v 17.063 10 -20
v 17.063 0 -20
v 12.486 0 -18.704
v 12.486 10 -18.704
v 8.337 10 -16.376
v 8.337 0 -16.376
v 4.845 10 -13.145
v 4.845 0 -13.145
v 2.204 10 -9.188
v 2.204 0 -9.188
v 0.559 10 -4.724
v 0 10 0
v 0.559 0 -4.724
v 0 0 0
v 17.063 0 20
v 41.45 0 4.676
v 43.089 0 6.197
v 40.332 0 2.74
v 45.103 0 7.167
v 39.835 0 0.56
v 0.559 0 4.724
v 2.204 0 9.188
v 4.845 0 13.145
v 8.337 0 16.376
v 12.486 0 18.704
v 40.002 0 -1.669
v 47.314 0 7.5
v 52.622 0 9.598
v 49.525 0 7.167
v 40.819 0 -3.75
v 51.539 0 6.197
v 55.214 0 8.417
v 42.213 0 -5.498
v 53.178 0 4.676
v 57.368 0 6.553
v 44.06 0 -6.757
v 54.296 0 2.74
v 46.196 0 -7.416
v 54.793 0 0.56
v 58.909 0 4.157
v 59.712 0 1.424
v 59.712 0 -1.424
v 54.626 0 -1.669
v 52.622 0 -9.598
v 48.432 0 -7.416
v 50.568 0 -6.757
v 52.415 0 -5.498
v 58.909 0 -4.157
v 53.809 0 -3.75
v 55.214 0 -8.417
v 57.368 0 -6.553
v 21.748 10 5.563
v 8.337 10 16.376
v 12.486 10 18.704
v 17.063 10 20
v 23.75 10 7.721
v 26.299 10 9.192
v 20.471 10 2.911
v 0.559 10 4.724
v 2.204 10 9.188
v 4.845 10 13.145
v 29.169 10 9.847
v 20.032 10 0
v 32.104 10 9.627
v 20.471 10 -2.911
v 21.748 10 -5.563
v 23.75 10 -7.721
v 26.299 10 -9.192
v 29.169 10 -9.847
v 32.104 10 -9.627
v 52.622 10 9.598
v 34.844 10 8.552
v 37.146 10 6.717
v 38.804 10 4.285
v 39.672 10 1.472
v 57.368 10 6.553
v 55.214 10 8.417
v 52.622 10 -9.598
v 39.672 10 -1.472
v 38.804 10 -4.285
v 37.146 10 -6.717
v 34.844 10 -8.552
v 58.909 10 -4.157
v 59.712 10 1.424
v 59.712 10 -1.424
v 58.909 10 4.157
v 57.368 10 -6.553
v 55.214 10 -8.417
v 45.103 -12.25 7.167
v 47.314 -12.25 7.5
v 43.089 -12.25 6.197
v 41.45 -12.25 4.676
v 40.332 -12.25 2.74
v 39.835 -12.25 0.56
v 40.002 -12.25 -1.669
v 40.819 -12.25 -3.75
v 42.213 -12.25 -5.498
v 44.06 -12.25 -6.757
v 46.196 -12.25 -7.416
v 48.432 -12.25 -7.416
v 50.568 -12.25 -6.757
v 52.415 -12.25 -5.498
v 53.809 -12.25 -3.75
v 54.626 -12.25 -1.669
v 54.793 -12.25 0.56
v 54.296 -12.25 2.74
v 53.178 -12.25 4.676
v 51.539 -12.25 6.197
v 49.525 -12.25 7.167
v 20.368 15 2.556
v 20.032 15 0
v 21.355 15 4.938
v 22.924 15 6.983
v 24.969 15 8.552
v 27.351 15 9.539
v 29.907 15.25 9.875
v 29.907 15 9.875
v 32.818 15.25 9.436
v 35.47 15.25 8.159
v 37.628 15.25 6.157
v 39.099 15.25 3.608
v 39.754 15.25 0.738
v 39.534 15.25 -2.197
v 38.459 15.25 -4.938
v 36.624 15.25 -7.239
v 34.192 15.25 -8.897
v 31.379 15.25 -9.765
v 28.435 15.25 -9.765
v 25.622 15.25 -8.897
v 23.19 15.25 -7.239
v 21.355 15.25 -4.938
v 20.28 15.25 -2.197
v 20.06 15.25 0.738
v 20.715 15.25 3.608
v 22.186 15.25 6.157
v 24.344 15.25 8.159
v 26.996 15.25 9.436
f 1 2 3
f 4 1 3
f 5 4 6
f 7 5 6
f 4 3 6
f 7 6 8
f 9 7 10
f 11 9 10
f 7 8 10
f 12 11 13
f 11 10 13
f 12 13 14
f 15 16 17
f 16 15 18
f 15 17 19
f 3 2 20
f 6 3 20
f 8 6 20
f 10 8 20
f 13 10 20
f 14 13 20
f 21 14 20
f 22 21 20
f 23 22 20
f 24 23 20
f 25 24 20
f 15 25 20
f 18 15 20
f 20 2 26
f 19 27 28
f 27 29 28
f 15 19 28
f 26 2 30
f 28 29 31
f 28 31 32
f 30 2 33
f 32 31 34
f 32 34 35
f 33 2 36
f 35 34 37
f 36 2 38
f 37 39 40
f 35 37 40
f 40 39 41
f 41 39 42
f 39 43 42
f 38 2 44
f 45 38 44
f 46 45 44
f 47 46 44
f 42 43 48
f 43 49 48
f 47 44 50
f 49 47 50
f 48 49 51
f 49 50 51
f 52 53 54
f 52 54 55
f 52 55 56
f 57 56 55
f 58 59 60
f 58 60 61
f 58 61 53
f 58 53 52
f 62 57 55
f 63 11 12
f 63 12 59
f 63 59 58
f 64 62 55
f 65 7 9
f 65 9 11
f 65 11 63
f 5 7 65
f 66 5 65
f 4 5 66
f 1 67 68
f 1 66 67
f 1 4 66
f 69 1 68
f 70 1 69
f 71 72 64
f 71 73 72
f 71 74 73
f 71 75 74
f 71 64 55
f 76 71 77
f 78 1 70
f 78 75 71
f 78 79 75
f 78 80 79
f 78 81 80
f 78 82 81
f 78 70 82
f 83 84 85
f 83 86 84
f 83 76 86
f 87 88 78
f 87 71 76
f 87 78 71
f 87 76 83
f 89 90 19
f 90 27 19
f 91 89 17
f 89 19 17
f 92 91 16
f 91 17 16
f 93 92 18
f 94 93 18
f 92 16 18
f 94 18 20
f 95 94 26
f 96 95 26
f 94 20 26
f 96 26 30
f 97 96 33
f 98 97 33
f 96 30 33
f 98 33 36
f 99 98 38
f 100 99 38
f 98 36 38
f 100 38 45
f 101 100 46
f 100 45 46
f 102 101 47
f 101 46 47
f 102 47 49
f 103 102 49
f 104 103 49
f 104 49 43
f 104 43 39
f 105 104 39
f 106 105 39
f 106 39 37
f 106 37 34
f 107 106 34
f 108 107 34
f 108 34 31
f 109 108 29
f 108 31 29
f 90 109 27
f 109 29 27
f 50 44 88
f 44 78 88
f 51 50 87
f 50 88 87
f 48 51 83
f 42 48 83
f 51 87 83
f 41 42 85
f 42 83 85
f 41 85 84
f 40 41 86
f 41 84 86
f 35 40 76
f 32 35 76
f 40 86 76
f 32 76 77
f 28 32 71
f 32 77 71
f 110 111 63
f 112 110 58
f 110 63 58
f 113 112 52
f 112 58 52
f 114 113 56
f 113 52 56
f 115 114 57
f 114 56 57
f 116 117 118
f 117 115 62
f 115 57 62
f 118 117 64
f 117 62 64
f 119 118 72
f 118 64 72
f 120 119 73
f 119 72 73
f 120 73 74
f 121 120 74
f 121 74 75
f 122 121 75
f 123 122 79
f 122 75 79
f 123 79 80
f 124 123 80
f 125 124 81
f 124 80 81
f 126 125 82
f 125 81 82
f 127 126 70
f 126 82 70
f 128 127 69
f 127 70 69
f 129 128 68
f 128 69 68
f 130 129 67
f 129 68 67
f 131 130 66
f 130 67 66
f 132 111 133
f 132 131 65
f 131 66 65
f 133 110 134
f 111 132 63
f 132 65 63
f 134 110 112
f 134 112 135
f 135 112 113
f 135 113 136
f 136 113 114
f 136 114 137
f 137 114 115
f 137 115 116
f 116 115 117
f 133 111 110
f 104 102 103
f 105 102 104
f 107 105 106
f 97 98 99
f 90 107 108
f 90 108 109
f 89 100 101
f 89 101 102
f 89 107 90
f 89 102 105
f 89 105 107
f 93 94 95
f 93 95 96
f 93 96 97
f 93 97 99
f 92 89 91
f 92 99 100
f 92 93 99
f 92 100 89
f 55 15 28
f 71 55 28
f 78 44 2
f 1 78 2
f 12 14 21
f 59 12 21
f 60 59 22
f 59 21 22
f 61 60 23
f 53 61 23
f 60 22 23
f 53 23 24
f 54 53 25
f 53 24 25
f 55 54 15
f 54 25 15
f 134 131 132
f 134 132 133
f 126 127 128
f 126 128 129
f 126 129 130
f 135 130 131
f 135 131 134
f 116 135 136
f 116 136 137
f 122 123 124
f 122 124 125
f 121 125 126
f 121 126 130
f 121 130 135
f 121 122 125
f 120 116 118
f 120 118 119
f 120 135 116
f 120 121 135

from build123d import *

# Parameters (mm, degrees)
BOSS_EXTRUDE9_DEPTH  = 10
FILLET8_R            = 10
BOSS_EXTRUDE10_DEPTH = 5
SKETCH12_R           = 7.5
BOSS_EXTRUDE11_DEPTH = 12.5
SKETCH14_R           = 9.875
BOSS_EXTRUDE12_DEPTH = 0.25
CUT_EXTRUDE1_START   = -0.25
SKETCH15_R           = 7.5
CUT_EXTRUDE1_DEPTH   = 0.25
CUT_EXTRUDE2_START   = -12
SKETCH18_R           = 7.5
CUT_EXTRUDE2_DEPTH   = 12
SKETCH19_R           = 7.5
BOSS_EXTRUDE13_DEPTH = 12


with BuildPart() as part:
    # Sketch8 → Boss-Extrude9 (new body)
    with BuildSketch(Plane(origin=(0, 0, 0), x_dir=(1, 0, 0), z_dir=(0, 1, 0))):
        Polygon((17.063256467, 20), (17.063256467, 0), (85.43, 0), align=None)
        with BuildLine():
            ThreePointArc((17.063256467, 20), (4.845449314, 13.144910814), (0, 0))
            Line((0, 0), (17.063256467, 0))
            Line((17.063256467, 0), (17.063256467, 20))
        make_face()
        with BuildLine():
            Line((17.063256467, 0), (0, 0))
            ThreePointArc((0, 0), (4.845449314, -13.144910814), (17.063256467, -20))
            Line((17.063256467, -20), (17.063256467, 0))
        make_face()
        Polygon((85.43, 0), (17.063256467, 0), (17.063256467, -20), align=None)
    extrude(amount=BOSS_EXTRUDE9_DEPTH)

    # Fillet8
    fillet8_edges = [part.edges().sort_by_distance(p)[0] for p in [
        (85.43, 5, 0),
    ]]
    fillet(fillet8_edges, radius=FILLET8_R)

    # Sketch11 → Boss-Extrude10 (add)
    with BuildSketch(Plane(origin=(0, 10, 0), x_dir=(1, 0, 0), z_dir=(0, 1, 0))):
        with BuildLine():
            Line((20.031975788, 0), (29.906975788, 0))
            Line((29.906975788, 0), (39.781975788, 0))
            ThreePointArc((39.781975788, 0), (29.906975788, 9.875), (20.031975788, 0))
        make_face()
        with BuildLine():
            Line((39.781975788, 0), (29.906975788, 0))
            Line((29.906975788, 0), (20.031975788, 0))
            ThreePointArc((20.031975788, 0), (29.906975788, -9.875), (39.781975788, 0))
        make_face()
    extrude(amount=BOSS_EXTRUDE10_DEPTH)

    # Sketch12 → Boss-Extrude11 (add)
    with BuildSketch(Plane.XZ):
        with Locations(Location((47.313951576, 0, 0), (0, 0, 90))):
            Circle(SKETCH12_R)
    extrude(amount=BOSS_EXTRUDE11_DEPTH)

    # Sketch14 → Boss-Extrude12 (add)
    with BuildSketch(Plane(origin=(0, 15, 0), x_dir=(1, 0, 0), z_dir=(0, 1, 0))):
        with Locations(Location((29.906975788, 0, 0), (0, 0, 270))):
            Circle(SKETCH14_R)
    extrude(amount=BOSS_EXTRUDE12_DEPTH)

    # Sketch15 → Cut-Extrude1 (cut)
    with BuildSketch(Plane.XZ.offset(12.5).offset(CUT_EXTRUDE1_START)):
        with Locations(Location((47.313951576, 0, 0), (0, 0, 90))):
            Circle(SKETCH15_R)
    extrude(amount=CUT_EXTRUDE1_DEPTH, mode=Mode.SUBTRACT)

    # Sketch18 → Cut-Extrude2 (cut)
    with BuildSketch(Plane.XZ.offset(12.25).offset(CUT_EXTRUDE2_START)):
        with Locations(Location((47.313951576, 0, 0), (0, 0, 90))):
            Circle(SKETCH18_R)
    extrude(amount=CUT_EXTRUDE2_DEPTH, mode=Mode.SUBTRACT)

    # Sketch19 → Boss-Extrude13 (add)
    with BuildSketch(Plane.XZ.offset(0.25)):
        with Locations(Location((47.313951576, 0, 0), (0, 0, 90))):
            Circle(SKETCH19_R)
    extrude(amount=BOSS_EXTRUDE13_DEPTH)


solid = part.part
